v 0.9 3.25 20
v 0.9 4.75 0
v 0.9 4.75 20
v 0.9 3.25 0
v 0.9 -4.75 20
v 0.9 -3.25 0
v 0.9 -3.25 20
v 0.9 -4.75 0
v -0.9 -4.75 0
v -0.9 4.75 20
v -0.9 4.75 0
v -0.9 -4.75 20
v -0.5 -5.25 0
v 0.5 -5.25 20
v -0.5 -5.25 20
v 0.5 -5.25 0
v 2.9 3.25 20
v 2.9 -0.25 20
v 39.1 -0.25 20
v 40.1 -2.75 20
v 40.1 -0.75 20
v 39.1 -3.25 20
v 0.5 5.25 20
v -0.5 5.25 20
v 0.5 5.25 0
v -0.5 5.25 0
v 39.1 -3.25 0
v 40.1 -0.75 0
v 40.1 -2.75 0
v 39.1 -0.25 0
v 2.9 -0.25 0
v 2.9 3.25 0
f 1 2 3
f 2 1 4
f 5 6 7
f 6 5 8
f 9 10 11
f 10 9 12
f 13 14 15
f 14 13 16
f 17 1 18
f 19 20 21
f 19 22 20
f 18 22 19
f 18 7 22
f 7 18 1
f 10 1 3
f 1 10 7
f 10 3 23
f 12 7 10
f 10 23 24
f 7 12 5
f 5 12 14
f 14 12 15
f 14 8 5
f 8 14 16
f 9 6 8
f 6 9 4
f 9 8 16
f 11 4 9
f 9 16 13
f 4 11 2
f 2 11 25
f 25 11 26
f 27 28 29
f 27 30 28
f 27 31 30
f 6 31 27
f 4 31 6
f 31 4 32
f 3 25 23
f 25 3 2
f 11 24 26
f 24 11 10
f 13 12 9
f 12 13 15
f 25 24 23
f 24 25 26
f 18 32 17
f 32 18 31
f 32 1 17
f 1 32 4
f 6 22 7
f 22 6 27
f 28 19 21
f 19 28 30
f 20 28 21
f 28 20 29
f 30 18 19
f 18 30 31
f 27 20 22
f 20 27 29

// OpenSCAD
/** 
 * Martin Egli
 * 2023-03-08
 */

module hold1(h1 = 20, loc_res = 32) {
    hull() {
        translate([-1/2, -10.5/2, 0])
        cube([1, 10.5, h1]);
        translate([-1.8/2, -9.5/2, 0])
        cube([1.8, 9.5, h1]);
    }
    translate([-1.8/2, -6.5/2, 0])
    cube([1.8+2, 6.5, h1]);
    hull() {
        translate([-1.8/2, -6.5/2, 0])
        cube([40, 3, h1]);
        translate([-1.8/2, -6.5/2+0.5, 0])
        cube([41, 2, h1]);
    }
}
hold1();
